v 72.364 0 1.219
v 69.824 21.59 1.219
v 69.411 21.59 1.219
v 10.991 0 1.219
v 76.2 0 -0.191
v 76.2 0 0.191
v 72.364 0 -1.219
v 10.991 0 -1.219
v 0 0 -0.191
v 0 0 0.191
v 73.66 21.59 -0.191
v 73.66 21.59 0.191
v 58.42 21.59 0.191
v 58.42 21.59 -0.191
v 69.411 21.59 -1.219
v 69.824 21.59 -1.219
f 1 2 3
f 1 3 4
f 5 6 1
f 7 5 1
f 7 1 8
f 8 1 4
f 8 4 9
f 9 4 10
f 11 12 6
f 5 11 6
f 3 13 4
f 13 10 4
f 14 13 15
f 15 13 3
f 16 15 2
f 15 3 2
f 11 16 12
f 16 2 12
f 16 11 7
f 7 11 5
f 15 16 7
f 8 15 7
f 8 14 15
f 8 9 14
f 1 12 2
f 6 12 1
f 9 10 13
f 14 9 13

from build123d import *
from OCP.BRepFilletAPI import BRepFilletAPI_MakeChamfer

# Parameters (mm, degrees)
BOSS_EXTRUDE1_DEPTH = 1.2192
CHAMFER1_SIZE       = 3.81
CHAMFER1_SIZE2      = 1.0287
CHAMFER2_SIZE       = 3.81
CHAMFER2_SIZE2      = 1.0287


with BuildPart() as part:
    # Sketch1 → Boss-Extrude1 (new, symmetric)
    with BuildSketch(Plane.XY):
        Polygon((0, 0), (58.42, 21.59), (73.66, 21.59), (76.2, 0), align=None)
    extrude(amount=BOSS_EXTRUDE1_DEPTH, both=True)

    # Chamfer1: one chamfer whose edges measure the first distance from different faces: ONE call of the kernel's chamfer builder (chamfer() names one face for all edges)
    chamfer1_edges_1 = [part.edges().sort_by_distance(p)[0] for p in [
        (29.21, 10.795, 1.2192),
    ]]
    chamfer1_side_1 = [part.faces().sort_by_distance(p)[0] for p in [
        (48.965555556, 8.396111111, 1.2192),
    ]]
    chamfer1_edges_2 = [part.edges().sort_by_distance(p)[0] for p in [
        (29.21, 10.795, -1.2192),
    ]]
    chamfer1_side_2 = [part.faces().sort_by_distance(p)[0] for p in [
        (48.965555556, 8.396111111, -1.2192),
    ]]
    chamfer1 = BRepFilletAPI_MakeChamfer(part.part.solid().wrapped)
    for e in chamfer1_edges_1:
        chamfer1.Add(CHAMFER1_SIZE, CHAMFER1_SIZE2, e.wrapped, chamfer1_side_1[0].wrapped)  # the first distance lies on this face
    for e in chamfer1_edges_2:
        chamfer1.Add(CHAMFER1_SIZE, CHAMFER1_SIZE2, e.wrapped, chamfer1_side_2[0].wrapped)  # the first distance lies on this face
    add(Compound.cast(chamfer1.Shape()), mode=Mode.REPLACE)

    # Chamfer2: one chamfer whose edges measure the first distance from different faces: ONE call of the kernel's chamfer builder (chamfer() names one face for all edges)
    chamfer2_edges_1 = [part.edges().sort_by_distance(p)[0] for p in [
        (74.93, 10.795, -1.2192),
    ]]
    chamfer2_side_1 = [part.faces().sort_by_distance(p)[0] for p in [
        (53.47852905, 7.636921414, -1.2192),
    ]]
    chamfer2_edges_2 = [part.edges().sort_by_distance(p)[0] for p in [
        (74.93, 10.795, 1.2192),
    ]]
    chamfer2_side_2 = [part.faces().sort_by_distance(p)[0] for p in [
        (53.47852905, 7.636921414, 1.2192),
    ]]
    chamfer2 = BRepFilletAPI_MakeChamfer(part.part.solid().wrapped)
    for e in chamfer2_edges_1:
        chamfer2.Add(CHAMFER2_SIZE, CHAMFER2_SIZE2, e.wrapped, chamfer2_side_1[0].wrapped)  # the first distance lies on this face
    for e in chamfer2_edges_2:
        chamfer2.Add(CHAMFER2_SIZE, CHAMFER2_SIZE2, e.wrapped, chamfer2_side_2[0].wrapped)  # the first distance lies on this face
    add(Compound.cast(chamfer2.Shape()), mode=Mode.REPLACE)


solid = part.part
